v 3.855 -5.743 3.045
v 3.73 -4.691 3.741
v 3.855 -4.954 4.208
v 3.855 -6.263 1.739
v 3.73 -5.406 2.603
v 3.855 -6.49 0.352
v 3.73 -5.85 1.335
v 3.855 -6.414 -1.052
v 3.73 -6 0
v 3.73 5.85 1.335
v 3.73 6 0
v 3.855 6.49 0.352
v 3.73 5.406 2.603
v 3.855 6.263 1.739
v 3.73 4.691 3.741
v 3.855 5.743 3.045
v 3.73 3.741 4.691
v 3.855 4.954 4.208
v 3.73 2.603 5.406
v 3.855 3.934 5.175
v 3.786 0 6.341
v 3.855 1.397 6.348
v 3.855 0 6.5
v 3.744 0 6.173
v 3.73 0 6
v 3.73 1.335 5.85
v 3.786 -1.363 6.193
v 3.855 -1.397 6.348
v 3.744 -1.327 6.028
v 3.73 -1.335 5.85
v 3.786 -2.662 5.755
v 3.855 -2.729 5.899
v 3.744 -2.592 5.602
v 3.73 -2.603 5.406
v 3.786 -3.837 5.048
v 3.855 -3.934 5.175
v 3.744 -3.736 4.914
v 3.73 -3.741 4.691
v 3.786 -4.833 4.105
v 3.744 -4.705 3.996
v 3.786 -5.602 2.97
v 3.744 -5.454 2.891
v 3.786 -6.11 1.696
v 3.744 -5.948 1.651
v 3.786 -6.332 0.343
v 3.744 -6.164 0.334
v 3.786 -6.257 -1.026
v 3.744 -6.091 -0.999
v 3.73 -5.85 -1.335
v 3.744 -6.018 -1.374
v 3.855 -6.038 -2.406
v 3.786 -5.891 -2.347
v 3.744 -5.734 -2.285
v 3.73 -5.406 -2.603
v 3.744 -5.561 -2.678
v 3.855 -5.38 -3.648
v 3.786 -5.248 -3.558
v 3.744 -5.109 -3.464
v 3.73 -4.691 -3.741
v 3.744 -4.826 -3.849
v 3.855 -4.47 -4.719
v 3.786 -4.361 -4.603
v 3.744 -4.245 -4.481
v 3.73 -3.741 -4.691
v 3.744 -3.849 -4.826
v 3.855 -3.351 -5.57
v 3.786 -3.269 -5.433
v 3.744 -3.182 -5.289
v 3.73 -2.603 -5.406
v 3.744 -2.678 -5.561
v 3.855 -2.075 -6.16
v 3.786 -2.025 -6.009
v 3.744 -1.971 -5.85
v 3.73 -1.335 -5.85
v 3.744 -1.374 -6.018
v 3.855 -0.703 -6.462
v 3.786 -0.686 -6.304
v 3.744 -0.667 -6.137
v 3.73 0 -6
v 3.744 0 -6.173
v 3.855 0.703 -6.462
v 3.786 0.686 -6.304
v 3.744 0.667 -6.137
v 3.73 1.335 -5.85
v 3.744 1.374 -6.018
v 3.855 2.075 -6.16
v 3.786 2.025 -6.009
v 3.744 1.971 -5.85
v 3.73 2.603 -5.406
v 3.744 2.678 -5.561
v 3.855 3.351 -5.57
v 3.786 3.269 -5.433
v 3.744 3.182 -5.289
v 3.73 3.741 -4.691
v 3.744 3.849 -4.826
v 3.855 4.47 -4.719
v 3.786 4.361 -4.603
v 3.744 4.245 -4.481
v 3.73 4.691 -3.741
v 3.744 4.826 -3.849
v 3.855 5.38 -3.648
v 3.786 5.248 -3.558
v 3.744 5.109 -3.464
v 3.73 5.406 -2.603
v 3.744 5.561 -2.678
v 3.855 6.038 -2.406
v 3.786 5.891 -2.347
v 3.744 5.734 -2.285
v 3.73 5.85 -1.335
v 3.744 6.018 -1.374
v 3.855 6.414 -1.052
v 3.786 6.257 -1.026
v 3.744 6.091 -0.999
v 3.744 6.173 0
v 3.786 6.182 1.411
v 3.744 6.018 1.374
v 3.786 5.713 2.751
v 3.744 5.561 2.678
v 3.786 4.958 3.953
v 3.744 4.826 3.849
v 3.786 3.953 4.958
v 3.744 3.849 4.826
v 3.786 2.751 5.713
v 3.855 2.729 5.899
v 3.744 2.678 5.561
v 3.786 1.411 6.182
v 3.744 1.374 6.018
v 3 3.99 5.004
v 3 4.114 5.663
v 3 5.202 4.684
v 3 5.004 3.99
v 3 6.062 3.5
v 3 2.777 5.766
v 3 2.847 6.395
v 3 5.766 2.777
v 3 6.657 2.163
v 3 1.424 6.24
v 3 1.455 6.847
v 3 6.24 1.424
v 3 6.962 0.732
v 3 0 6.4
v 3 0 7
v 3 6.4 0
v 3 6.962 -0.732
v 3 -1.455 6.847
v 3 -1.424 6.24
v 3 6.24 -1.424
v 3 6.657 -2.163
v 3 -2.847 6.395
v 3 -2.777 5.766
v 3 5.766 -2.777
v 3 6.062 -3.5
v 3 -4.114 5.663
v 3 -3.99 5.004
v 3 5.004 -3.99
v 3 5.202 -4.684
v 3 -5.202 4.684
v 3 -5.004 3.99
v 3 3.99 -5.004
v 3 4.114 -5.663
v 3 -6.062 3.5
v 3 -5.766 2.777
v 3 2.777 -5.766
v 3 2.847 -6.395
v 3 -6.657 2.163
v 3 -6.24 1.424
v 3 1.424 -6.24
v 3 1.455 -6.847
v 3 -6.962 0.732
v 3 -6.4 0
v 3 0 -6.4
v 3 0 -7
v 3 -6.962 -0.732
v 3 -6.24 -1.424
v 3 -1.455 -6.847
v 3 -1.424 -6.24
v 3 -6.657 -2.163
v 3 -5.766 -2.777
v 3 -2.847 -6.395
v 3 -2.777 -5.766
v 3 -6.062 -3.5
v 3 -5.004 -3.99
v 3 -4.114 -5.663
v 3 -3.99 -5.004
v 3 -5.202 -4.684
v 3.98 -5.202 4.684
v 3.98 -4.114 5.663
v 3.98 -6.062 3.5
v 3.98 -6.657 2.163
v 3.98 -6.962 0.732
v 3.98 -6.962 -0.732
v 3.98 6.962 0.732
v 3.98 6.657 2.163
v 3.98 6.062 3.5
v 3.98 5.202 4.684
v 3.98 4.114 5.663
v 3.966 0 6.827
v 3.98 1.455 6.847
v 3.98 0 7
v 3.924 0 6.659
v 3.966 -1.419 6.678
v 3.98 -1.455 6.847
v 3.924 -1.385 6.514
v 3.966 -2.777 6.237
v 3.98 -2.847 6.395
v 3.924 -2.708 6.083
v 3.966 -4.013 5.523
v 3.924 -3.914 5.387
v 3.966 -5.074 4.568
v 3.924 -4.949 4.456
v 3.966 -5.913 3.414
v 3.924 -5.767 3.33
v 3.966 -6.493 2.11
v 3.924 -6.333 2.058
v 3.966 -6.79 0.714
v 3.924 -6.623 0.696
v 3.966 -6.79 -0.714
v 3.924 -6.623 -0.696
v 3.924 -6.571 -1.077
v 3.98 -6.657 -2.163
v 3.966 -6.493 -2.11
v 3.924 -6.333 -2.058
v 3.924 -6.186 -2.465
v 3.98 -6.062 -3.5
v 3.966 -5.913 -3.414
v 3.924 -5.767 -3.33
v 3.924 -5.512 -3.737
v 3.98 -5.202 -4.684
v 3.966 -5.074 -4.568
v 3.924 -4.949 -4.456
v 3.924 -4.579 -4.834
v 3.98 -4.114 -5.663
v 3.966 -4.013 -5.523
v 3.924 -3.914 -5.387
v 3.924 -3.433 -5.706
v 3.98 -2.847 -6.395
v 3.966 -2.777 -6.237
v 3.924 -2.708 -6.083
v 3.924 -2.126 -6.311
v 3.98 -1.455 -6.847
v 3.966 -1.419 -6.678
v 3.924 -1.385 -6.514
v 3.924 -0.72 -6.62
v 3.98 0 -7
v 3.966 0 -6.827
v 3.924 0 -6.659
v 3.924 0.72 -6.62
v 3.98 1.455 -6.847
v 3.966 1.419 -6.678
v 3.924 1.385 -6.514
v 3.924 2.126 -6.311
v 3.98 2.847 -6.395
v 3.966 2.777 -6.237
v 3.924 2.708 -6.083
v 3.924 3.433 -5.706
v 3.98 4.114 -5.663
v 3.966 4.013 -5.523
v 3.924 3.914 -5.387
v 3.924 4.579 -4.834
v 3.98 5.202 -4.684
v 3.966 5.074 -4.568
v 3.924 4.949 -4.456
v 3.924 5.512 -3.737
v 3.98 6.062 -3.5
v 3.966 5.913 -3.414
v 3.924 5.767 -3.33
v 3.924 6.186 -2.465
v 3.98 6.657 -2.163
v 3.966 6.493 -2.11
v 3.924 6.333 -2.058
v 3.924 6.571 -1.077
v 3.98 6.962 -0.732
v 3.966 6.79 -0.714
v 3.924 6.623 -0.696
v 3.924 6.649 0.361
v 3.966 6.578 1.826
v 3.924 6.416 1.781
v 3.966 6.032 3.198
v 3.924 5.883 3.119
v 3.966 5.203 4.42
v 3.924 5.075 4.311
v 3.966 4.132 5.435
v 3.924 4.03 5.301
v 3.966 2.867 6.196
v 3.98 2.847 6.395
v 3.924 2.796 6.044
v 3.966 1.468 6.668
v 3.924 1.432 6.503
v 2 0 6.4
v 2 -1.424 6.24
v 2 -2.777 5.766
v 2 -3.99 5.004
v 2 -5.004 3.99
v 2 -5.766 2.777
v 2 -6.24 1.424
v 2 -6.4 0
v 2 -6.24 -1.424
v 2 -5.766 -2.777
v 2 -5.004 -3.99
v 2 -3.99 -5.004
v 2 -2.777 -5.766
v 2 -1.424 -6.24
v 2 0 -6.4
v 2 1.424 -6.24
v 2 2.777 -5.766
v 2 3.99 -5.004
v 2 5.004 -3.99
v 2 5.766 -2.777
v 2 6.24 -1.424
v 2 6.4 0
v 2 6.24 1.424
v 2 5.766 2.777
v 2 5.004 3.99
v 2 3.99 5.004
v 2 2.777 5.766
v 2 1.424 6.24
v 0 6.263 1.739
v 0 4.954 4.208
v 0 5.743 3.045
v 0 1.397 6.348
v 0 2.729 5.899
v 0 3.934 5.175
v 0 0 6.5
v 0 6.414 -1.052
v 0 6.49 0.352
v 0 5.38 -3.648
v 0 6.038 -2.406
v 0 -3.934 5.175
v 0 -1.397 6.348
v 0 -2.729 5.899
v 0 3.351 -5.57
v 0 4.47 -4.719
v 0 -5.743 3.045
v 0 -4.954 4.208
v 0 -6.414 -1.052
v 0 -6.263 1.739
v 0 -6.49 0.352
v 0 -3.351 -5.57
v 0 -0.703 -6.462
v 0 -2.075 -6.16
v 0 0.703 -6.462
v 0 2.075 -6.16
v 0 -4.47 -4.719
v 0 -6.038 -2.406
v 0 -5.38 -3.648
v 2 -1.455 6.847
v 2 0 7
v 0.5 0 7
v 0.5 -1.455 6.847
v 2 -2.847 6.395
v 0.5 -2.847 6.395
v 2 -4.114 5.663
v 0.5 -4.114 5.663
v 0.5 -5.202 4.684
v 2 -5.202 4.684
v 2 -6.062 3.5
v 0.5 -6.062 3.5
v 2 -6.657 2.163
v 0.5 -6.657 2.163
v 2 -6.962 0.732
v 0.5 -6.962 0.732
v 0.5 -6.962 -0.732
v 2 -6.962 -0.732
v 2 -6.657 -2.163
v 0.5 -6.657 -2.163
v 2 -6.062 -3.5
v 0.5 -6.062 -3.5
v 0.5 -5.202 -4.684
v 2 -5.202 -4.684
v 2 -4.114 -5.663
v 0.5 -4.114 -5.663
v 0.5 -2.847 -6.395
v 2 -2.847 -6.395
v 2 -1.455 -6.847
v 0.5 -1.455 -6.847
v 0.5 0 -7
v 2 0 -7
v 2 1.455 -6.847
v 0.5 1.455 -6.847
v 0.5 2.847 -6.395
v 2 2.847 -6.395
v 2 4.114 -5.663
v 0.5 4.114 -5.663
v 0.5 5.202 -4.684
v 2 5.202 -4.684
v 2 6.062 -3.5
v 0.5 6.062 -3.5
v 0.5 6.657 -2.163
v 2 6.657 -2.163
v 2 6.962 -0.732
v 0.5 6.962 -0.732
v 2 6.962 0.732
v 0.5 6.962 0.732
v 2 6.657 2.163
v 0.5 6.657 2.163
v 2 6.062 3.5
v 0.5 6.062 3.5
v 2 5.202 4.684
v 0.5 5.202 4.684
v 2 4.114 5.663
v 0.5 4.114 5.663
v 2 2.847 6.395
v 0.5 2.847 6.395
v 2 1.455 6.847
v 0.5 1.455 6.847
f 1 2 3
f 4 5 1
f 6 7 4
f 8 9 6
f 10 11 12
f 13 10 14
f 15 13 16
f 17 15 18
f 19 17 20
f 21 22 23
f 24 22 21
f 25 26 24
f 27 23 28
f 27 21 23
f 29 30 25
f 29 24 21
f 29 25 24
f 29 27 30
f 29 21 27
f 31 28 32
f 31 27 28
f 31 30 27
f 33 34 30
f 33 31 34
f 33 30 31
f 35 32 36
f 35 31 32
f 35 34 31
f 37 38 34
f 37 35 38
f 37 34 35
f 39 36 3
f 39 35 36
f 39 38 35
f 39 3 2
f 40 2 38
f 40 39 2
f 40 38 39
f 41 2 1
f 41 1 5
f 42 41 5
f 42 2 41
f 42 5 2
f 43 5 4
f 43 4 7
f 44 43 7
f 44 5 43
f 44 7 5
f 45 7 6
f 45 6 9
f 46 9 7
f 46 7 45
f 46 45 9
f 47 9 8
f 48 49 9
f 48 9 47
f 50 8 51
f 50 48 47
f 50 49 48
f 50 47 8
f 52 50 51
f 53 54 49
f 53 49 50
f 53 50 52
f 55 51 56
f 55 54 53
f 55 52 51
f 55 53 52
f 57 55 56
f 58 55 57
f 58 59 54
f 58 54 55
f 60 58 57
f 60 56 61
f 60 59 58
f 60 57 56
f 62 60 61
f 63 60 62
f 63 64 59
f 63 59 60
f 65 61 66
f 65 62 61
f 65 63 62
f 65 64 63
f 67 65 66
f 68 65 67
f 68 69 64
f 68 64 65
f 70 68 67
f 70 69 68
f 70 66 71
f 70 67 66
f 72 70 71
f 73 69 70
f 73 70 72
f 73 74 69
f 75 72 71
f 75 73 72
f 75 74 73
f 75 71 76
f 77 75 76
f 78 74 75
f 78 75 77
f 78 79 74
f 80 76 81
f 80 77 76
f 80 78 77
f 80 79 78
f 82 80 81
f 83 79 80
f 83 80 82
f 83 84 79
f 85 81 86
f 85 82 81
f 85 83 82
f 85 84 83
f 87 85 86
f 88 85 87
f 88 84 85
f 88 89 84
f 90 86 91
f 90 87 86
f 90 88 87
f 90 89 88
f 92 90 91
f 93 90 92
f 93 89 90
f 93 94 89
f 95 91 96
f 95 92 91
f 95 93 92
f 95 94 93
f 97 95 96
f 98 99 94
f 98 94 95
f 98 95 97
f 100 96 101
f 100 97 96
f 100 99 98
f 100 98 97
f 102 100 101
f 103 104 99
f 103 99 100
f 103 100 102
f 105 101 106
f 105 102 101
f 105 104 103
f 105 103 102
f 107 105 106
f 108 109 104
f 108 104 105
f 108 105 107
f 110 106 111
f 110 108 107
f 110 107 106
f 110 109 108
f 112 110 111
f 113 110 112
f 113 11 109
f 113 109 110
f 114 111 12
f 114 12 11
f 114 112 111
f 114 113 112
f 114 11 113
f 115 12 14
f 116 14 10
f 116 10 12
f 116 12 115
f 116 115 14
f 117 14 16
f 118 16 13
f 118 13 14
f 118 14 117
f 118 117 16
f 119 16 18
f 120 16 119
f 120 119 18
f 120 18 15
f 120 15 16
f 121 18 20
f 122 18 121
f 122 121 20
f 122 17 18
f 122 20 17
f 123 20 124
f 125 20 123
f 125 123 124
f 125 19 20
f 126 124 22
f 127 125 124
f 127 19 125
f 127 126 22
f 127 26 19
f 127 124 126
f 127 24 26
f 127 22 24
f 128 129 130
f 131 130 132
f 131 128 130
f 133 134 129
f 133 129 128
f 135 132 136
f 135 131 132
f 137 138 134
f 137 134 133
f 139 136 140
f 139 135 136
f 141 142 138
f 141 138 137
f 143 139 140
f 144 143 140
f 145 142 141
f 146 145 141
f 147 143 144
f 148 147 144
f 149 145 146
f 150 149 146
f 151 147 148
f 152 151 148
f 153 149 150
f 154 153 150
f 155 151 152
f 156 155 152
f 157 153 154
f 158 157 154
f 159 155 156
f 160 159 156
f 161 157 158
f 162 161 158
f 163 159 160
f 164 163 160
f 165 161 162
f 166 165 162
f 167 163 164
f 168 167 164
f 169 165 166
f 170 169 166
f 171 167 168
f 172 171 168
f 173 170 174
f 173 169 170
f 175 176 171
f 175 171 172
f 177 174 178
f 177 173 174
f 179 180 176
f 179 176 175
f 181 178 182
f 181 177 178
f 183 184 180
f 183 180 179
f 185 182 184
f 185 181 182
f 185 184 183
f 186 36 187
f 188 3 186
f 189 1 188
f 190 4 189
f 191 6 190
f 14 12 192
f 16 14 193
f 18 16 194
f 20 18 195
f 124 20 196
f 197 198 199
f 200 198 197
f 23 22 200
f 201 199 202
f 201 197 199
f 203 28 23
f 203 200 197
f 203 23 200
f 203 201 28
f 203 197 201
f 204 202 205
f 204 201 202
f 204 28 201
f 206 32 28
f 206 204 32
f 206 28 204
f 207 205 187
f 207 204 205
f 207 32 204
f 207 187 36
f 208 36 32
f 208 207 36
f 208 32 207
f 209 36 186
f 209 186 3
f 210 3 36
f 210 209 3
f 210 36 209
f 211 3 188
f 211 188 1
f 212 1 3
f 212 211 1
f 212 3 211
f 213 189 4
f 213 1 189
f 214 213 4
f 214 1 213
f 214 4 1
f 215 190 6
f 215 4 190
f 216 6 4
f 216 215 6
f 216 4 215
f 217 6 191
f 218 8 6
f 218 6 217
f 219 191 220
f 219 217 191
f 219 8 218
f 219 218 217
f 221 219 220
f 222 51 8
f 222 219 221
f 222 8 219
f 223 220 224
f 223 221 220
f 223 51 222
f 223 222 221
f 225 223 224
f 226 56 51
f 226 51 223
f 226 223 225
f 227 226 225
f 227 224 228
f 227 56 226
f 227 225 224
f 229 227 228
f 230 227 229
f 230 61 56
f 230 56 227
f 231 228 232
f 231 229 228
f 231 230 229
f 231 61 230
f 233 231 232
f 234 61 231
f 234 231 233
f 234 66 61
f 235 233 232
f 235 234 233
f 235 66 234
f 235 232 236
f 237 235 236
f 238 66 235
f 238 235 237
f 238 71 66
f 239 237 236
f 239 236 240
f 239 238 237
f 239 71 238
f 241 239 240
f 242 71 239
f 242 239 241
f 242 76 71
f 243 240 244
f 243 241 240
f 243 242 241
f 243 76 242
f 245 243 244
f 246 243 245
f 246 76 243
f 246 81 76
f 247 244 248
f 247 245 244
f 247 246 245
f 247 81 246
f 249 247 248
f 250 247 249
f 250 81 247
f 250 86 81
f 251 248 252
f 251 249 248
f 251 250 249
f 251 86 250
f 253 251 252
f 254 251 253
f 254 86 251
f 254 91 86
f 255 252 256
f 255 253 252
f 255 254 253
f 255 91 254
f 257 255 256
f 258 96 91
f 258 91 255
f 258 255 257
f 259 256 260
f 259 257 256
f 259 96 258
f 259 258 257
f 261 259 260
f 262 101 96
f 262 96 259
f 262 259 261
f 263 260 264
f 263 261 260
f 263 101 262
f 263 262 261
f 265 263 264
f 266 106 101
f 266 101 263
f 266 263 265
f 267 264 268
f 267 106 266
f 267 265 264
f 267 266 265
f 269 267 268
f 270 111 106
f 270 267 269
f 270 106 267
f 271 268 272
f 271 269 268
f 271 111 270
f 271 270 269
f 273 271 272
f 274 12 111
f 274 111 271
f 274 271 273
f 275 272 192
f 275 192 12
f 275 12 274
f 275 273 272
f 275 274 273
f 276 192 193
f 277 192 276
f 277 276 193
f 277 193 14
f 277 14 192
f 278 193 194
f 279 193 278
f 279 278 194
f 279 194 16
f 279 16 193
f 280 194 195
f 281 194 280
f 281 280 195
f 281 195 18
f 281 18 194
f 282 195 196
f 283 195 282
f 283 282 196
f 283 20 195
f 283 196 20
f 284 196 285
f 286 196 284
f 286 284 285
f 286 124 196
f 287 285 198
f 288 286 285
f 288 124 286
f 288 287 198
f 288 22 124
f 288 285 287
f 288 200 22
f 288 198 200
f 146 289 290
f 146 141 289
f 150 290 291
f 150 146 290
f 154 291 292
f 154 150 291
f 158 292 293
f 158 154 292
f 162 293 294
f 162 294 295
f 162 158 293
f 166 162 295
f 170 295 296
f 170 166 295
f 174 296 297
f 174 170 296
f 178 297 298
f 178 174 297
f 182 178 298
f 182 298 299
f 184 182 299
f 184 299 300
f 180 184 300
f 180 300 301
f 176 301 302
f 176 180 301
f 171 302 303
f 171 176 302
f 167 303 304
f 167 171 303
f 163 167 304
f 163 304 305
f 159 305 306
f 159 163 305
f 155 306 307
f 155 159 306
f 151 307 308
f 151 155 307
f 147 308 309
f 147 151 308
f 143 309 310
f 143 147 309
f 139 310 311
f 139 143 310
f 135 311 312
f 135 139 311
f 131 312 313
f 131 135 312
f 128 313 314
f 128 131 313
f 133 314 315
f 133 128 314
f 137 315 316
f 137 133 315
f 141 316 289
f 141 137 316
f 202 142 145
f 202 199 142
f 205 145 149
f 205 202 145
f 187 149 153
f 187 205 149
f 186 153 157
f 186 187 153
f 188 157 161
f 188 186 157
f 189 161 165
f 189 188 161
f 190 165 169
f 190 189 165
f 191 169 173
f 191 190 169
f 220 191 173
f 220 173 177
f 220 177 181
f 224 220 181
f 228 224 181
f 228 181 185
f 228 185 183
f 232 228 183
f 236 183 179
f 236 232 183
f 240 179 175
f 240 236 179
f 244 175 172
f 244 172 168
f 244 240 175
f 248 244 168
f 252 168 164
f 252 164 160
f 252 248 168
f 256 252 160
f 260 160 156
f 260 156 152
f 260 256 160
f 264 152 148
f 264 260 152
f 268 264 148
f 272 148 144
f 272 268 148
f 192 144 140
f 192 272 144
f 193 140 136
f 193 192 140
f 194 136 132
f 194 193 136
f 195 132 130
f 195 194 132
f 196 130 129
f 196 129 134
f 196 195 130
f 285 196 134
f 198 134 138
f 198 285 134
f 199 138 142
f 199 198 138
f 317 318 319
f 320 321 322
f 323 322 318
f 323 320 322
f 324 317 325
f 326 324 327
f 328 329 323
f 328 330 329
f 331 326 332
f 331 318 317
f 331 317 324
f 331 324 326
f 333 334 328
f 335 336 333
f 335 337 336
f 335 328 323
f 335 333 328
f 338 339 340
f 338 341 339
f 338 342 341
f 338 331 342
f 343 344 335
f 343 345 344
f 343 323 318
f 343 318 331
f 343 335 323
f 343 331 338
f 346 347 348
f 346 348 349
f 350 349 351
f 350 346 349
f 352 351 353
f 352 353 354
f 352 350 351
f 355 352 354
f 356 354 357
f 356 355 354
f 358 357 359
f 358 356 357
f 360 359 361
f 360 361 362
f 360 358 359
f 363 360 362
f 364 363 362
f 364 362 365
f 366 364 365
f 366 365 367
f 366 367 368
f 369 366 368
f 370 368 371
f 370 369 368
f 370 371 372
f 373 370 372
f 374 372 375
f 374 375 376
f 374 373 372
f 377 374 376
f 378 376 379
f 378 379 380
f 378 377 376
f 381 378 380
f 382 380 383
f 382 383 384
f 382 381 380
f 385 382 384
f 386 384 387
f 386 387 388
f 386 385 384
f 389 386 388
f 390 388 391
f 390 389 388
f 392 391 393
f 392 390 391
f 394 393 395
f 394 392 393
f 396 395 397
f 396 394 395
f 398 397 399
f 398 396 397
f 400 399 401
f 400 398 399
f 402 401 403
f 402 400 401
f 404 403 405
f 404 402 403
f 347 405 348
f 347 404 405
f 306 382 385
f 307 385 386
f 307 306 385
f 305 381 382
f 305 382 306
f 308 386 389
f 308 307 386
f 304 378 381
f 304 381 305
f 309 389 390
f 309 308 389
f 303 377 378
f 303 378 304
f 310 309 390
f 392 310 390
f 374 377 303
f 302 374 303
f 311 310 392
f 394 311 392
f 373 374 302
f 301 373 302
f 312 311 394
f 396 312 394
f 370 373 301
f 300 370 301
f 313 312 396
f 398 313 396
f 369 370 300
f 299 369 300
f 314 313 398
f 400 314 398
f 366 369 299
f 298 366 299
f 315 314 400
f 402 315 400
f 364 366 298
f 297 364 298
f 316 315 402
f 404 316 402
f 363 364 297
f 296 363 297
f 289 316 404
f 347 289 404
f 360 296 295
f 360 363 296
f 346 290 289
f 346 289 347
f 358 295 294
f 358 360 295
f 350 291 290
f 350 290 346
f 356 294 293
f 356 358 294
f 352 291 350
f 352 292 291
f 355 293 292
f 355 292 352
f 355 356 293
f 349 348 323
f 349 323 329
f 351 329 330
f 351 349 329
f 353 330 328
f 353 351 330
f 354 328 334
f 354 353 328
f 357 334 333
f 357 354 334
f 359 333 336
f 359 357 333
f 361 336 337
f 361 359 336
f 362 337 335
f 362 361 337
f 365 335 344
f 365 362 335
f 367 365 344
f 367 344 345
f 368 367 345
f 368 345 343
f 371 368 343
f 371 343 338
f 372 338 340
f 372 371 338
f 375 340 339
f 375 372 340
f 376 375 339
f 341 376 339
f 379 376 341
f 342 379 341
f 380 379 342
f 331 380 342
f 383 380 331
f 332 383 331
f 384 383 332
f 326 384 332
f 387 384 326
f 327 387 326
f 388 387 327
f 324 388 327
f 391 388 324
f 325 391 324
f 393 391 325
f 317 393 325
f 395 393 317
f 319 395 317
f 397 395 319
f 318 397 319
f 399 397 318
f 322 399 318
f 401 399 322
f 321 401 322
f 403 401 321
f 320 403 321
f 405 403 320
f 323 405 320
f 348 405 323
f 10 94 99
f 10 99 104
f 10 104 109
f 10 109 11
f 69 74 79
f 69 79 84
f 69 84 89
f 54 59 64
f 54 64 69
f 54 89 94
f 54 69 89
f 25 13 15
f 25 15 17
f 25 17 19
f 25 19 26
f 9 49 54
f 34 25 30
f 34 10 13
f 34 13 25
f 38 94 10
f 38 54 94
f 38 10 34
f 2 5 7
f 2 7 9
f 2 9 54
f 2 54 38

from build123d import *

# Parameters (mm, degrees)
CHAMFER1_SIZE = 0.5


with BuildPart() as part:
    # Sketch1 → Revolve1 (revolve)
    with BuildSketch(Plane.XY, mode=Mode.PRIVATE) as revolve1_sk:
        with BuildLine():
            Line((0, 0), (0, 7))
            Line((0, 7), (2, 7))
            Line((2, 7), (2, 6.4))
            Line((2, 6.4), (3, 6.4))
            Line((3, 6.4), (3, 7))
            Line((3, 7), (3.98, 7))
            ThreePointArc((3.98, 7), (3.948276406, 6.742305898), (3.855, 6.5))
            ThreePointArc((3.855, 6.5), (3.761723594, 6.257694102), (3.73, 6))
            Line((3.73, 6), (3.73, 0))
            Line((3.73, 0), (0, 0))
        make_face()
    revolve(revolve1_sk.sketch.rotate(Axis((0, 0, 0), (1, 0, 0)), 90), axis=Axis((0, 0, 0), (1, 0, 0)))

    # Chamfer1
    chamfer1_edges = [part.edges().sort_by_distance(p)[0] for p in [
        (0, 0, -7),
    ]]
    chamfer(chamfer1_edges, length=CHAMFER1_SIZE)


solid = part.part
